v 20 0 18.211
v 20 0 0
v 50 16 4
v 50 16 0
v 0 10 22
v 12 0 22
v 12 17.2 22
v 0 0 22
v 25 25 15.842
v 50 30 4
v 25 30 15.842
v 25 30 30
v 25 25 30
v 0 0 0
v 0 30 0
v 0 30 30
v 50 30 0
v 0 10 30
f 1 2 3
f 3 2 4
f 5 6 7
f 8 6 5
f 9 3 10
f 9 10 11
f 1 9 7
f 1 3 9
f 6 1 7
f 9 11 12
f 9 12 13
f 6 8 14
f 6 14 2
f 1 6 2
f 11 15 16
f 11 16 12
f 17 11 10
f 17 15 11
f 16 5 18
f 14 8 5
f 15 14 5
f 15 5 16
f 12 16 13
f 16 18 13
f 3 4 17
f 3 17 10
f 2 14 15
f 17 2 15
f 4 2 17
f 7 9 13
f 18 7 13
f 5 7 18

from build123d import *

# Parameters (mm, degrees)
F1_DEPTH = 30
F3_DEPTH = 22.001
F4_DEPTH = 30


with BuildPart() as f1:
    # F0 (on Front) → F1 (new body)
    with BuildSketch(Plane.XZ):
        Polygon((0, 22), (0, 0), (50, 0), (50, 4), (12, 22), align=None)
    extrude(amount=-F1_DEPTH)

    # F2 (on face) → F3 (cut, through all)
    with BuildSketch(Plane(origin=(0, 0, 0), x_dir=(1, 0, 0), z_dir=(0, 0, -1))):
        Polygon((20, 0), (50, -16), (50, 0), align=None)
    extrude(amount=-F3_DEPTH, mode=Mode.SUBTRACT)

    # F2 (on face) → F4 (join)
    with BuildSketch(Plane(origin=(0, 0, 0), x_dir=(1, 0, 0), z_dir=(0, 0, -1))):
        Polygon((0, -30), (25, -30), (25, -25), (0, -10), align=None)
    extrude(amount=-F4_DEPTH)


solid = f1.part
